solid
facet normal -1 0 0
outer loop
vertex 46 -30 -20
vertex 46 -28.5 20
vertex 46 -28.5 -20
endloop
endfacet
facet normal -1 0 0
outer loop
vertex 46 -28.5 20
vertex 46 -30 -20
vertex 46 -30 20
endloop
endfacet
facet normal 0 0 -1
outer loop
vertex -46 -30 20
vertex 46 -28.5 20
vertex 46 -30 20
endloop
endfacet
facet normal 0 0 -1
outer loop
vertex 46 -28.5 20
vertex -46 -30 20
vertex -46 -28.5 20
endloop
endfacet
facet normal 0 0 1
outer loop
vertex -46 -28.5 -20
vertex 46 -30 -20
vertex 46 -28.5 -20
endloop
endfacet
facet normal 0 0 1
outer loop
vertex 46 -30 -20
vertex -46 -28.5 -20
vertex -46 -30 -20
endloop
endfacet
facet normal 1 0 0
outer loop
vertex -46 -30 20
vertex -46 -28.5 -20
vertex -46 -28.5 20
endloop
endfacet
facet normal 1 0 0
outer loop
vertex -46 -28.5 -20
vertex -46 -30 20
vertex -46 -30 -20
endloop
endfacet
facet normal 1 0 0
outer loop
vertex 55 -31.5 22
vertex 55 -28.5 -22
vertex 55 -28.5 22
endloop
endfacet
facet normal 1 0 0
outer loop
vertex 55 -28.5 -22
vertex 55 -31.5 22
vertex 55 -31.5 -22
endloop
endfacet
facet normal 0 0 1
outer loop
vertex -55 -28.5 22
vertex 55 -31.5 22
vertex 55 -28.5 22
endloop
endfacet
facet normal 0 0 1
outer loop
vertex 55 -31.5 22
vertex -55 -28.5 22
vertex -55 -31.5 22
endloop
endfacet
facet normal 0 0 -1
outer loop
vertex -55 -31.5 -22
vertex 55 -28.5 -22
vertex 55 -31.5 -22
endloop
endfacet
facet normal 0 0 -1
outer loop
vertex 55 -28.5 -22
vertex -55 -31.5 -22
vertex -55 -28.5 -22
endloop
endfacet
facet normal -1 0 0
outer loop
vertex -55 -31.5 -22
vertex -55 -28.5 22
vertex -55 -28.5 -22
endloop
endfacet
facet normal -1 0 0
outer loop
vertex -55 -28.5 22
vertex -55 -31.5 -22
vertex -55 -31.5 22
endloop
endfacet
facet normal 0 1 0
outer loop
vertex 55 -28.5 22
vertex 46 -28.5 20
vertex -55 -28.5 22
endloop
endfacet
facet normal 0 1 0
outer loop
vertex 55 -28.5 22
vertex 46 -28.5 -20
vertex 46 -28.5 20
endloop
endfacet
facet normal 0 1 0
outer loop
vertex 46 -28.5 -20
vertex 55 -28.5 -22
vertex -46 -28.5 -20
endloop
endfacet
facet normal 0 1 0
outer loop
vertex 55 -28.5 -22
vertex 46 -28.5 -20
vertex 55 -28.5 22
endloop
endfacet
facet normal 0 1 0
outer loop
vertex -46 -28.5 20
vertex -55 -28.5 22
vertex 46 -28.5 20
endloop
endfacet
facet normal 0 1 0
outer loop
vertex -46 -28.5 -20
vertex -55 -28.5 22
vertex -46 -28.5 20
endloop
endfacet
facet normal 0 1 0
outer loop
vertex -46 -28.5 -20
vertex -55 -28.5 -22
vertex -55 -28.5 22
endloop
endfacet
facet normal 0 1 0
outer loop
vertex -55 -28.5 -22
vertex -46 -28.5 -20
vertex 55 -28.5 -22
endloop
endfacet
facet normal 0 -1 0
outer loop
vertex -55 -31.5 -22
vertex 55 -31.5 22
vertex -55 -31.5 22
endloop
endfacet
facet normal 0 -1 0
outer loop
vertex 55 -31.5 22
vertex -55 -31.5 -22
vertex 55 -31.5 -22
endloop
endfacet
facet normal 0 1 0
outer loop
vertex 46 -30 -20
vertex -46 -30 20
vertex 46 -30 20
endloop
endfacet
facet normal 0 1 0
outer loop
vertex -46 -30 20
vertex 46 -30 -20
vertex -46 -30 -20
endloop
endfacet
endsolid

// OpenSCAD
module Hopper() {
  CARDW = 90;
  CARDH = 38;
  
  HOPPERD = 60;
  HOPPER_WALL_SIZE = 2;
  
  difference(){
    union() {
      cube([CARDW + HOPPER_WALL_SIZE, HOPPERD, CARDH + HOPPER_WALL_SIZE], center=true);
      
      // Flange for mounting
      translate([0,-HOPPERD/2,0])
        cube([CARDW + HOPPER_WALL_SIZE * 10, 3, CARDH + HOPPER_WALL_SIZE * 3], center=true);
    }
    
    // Cutout channel
    cube([CARDW + HOPPER_WALL_SIZE, HOPPERD, CARDH + HOPPER_WALL_SIZE], center=true);
  }
}

Hopper();
